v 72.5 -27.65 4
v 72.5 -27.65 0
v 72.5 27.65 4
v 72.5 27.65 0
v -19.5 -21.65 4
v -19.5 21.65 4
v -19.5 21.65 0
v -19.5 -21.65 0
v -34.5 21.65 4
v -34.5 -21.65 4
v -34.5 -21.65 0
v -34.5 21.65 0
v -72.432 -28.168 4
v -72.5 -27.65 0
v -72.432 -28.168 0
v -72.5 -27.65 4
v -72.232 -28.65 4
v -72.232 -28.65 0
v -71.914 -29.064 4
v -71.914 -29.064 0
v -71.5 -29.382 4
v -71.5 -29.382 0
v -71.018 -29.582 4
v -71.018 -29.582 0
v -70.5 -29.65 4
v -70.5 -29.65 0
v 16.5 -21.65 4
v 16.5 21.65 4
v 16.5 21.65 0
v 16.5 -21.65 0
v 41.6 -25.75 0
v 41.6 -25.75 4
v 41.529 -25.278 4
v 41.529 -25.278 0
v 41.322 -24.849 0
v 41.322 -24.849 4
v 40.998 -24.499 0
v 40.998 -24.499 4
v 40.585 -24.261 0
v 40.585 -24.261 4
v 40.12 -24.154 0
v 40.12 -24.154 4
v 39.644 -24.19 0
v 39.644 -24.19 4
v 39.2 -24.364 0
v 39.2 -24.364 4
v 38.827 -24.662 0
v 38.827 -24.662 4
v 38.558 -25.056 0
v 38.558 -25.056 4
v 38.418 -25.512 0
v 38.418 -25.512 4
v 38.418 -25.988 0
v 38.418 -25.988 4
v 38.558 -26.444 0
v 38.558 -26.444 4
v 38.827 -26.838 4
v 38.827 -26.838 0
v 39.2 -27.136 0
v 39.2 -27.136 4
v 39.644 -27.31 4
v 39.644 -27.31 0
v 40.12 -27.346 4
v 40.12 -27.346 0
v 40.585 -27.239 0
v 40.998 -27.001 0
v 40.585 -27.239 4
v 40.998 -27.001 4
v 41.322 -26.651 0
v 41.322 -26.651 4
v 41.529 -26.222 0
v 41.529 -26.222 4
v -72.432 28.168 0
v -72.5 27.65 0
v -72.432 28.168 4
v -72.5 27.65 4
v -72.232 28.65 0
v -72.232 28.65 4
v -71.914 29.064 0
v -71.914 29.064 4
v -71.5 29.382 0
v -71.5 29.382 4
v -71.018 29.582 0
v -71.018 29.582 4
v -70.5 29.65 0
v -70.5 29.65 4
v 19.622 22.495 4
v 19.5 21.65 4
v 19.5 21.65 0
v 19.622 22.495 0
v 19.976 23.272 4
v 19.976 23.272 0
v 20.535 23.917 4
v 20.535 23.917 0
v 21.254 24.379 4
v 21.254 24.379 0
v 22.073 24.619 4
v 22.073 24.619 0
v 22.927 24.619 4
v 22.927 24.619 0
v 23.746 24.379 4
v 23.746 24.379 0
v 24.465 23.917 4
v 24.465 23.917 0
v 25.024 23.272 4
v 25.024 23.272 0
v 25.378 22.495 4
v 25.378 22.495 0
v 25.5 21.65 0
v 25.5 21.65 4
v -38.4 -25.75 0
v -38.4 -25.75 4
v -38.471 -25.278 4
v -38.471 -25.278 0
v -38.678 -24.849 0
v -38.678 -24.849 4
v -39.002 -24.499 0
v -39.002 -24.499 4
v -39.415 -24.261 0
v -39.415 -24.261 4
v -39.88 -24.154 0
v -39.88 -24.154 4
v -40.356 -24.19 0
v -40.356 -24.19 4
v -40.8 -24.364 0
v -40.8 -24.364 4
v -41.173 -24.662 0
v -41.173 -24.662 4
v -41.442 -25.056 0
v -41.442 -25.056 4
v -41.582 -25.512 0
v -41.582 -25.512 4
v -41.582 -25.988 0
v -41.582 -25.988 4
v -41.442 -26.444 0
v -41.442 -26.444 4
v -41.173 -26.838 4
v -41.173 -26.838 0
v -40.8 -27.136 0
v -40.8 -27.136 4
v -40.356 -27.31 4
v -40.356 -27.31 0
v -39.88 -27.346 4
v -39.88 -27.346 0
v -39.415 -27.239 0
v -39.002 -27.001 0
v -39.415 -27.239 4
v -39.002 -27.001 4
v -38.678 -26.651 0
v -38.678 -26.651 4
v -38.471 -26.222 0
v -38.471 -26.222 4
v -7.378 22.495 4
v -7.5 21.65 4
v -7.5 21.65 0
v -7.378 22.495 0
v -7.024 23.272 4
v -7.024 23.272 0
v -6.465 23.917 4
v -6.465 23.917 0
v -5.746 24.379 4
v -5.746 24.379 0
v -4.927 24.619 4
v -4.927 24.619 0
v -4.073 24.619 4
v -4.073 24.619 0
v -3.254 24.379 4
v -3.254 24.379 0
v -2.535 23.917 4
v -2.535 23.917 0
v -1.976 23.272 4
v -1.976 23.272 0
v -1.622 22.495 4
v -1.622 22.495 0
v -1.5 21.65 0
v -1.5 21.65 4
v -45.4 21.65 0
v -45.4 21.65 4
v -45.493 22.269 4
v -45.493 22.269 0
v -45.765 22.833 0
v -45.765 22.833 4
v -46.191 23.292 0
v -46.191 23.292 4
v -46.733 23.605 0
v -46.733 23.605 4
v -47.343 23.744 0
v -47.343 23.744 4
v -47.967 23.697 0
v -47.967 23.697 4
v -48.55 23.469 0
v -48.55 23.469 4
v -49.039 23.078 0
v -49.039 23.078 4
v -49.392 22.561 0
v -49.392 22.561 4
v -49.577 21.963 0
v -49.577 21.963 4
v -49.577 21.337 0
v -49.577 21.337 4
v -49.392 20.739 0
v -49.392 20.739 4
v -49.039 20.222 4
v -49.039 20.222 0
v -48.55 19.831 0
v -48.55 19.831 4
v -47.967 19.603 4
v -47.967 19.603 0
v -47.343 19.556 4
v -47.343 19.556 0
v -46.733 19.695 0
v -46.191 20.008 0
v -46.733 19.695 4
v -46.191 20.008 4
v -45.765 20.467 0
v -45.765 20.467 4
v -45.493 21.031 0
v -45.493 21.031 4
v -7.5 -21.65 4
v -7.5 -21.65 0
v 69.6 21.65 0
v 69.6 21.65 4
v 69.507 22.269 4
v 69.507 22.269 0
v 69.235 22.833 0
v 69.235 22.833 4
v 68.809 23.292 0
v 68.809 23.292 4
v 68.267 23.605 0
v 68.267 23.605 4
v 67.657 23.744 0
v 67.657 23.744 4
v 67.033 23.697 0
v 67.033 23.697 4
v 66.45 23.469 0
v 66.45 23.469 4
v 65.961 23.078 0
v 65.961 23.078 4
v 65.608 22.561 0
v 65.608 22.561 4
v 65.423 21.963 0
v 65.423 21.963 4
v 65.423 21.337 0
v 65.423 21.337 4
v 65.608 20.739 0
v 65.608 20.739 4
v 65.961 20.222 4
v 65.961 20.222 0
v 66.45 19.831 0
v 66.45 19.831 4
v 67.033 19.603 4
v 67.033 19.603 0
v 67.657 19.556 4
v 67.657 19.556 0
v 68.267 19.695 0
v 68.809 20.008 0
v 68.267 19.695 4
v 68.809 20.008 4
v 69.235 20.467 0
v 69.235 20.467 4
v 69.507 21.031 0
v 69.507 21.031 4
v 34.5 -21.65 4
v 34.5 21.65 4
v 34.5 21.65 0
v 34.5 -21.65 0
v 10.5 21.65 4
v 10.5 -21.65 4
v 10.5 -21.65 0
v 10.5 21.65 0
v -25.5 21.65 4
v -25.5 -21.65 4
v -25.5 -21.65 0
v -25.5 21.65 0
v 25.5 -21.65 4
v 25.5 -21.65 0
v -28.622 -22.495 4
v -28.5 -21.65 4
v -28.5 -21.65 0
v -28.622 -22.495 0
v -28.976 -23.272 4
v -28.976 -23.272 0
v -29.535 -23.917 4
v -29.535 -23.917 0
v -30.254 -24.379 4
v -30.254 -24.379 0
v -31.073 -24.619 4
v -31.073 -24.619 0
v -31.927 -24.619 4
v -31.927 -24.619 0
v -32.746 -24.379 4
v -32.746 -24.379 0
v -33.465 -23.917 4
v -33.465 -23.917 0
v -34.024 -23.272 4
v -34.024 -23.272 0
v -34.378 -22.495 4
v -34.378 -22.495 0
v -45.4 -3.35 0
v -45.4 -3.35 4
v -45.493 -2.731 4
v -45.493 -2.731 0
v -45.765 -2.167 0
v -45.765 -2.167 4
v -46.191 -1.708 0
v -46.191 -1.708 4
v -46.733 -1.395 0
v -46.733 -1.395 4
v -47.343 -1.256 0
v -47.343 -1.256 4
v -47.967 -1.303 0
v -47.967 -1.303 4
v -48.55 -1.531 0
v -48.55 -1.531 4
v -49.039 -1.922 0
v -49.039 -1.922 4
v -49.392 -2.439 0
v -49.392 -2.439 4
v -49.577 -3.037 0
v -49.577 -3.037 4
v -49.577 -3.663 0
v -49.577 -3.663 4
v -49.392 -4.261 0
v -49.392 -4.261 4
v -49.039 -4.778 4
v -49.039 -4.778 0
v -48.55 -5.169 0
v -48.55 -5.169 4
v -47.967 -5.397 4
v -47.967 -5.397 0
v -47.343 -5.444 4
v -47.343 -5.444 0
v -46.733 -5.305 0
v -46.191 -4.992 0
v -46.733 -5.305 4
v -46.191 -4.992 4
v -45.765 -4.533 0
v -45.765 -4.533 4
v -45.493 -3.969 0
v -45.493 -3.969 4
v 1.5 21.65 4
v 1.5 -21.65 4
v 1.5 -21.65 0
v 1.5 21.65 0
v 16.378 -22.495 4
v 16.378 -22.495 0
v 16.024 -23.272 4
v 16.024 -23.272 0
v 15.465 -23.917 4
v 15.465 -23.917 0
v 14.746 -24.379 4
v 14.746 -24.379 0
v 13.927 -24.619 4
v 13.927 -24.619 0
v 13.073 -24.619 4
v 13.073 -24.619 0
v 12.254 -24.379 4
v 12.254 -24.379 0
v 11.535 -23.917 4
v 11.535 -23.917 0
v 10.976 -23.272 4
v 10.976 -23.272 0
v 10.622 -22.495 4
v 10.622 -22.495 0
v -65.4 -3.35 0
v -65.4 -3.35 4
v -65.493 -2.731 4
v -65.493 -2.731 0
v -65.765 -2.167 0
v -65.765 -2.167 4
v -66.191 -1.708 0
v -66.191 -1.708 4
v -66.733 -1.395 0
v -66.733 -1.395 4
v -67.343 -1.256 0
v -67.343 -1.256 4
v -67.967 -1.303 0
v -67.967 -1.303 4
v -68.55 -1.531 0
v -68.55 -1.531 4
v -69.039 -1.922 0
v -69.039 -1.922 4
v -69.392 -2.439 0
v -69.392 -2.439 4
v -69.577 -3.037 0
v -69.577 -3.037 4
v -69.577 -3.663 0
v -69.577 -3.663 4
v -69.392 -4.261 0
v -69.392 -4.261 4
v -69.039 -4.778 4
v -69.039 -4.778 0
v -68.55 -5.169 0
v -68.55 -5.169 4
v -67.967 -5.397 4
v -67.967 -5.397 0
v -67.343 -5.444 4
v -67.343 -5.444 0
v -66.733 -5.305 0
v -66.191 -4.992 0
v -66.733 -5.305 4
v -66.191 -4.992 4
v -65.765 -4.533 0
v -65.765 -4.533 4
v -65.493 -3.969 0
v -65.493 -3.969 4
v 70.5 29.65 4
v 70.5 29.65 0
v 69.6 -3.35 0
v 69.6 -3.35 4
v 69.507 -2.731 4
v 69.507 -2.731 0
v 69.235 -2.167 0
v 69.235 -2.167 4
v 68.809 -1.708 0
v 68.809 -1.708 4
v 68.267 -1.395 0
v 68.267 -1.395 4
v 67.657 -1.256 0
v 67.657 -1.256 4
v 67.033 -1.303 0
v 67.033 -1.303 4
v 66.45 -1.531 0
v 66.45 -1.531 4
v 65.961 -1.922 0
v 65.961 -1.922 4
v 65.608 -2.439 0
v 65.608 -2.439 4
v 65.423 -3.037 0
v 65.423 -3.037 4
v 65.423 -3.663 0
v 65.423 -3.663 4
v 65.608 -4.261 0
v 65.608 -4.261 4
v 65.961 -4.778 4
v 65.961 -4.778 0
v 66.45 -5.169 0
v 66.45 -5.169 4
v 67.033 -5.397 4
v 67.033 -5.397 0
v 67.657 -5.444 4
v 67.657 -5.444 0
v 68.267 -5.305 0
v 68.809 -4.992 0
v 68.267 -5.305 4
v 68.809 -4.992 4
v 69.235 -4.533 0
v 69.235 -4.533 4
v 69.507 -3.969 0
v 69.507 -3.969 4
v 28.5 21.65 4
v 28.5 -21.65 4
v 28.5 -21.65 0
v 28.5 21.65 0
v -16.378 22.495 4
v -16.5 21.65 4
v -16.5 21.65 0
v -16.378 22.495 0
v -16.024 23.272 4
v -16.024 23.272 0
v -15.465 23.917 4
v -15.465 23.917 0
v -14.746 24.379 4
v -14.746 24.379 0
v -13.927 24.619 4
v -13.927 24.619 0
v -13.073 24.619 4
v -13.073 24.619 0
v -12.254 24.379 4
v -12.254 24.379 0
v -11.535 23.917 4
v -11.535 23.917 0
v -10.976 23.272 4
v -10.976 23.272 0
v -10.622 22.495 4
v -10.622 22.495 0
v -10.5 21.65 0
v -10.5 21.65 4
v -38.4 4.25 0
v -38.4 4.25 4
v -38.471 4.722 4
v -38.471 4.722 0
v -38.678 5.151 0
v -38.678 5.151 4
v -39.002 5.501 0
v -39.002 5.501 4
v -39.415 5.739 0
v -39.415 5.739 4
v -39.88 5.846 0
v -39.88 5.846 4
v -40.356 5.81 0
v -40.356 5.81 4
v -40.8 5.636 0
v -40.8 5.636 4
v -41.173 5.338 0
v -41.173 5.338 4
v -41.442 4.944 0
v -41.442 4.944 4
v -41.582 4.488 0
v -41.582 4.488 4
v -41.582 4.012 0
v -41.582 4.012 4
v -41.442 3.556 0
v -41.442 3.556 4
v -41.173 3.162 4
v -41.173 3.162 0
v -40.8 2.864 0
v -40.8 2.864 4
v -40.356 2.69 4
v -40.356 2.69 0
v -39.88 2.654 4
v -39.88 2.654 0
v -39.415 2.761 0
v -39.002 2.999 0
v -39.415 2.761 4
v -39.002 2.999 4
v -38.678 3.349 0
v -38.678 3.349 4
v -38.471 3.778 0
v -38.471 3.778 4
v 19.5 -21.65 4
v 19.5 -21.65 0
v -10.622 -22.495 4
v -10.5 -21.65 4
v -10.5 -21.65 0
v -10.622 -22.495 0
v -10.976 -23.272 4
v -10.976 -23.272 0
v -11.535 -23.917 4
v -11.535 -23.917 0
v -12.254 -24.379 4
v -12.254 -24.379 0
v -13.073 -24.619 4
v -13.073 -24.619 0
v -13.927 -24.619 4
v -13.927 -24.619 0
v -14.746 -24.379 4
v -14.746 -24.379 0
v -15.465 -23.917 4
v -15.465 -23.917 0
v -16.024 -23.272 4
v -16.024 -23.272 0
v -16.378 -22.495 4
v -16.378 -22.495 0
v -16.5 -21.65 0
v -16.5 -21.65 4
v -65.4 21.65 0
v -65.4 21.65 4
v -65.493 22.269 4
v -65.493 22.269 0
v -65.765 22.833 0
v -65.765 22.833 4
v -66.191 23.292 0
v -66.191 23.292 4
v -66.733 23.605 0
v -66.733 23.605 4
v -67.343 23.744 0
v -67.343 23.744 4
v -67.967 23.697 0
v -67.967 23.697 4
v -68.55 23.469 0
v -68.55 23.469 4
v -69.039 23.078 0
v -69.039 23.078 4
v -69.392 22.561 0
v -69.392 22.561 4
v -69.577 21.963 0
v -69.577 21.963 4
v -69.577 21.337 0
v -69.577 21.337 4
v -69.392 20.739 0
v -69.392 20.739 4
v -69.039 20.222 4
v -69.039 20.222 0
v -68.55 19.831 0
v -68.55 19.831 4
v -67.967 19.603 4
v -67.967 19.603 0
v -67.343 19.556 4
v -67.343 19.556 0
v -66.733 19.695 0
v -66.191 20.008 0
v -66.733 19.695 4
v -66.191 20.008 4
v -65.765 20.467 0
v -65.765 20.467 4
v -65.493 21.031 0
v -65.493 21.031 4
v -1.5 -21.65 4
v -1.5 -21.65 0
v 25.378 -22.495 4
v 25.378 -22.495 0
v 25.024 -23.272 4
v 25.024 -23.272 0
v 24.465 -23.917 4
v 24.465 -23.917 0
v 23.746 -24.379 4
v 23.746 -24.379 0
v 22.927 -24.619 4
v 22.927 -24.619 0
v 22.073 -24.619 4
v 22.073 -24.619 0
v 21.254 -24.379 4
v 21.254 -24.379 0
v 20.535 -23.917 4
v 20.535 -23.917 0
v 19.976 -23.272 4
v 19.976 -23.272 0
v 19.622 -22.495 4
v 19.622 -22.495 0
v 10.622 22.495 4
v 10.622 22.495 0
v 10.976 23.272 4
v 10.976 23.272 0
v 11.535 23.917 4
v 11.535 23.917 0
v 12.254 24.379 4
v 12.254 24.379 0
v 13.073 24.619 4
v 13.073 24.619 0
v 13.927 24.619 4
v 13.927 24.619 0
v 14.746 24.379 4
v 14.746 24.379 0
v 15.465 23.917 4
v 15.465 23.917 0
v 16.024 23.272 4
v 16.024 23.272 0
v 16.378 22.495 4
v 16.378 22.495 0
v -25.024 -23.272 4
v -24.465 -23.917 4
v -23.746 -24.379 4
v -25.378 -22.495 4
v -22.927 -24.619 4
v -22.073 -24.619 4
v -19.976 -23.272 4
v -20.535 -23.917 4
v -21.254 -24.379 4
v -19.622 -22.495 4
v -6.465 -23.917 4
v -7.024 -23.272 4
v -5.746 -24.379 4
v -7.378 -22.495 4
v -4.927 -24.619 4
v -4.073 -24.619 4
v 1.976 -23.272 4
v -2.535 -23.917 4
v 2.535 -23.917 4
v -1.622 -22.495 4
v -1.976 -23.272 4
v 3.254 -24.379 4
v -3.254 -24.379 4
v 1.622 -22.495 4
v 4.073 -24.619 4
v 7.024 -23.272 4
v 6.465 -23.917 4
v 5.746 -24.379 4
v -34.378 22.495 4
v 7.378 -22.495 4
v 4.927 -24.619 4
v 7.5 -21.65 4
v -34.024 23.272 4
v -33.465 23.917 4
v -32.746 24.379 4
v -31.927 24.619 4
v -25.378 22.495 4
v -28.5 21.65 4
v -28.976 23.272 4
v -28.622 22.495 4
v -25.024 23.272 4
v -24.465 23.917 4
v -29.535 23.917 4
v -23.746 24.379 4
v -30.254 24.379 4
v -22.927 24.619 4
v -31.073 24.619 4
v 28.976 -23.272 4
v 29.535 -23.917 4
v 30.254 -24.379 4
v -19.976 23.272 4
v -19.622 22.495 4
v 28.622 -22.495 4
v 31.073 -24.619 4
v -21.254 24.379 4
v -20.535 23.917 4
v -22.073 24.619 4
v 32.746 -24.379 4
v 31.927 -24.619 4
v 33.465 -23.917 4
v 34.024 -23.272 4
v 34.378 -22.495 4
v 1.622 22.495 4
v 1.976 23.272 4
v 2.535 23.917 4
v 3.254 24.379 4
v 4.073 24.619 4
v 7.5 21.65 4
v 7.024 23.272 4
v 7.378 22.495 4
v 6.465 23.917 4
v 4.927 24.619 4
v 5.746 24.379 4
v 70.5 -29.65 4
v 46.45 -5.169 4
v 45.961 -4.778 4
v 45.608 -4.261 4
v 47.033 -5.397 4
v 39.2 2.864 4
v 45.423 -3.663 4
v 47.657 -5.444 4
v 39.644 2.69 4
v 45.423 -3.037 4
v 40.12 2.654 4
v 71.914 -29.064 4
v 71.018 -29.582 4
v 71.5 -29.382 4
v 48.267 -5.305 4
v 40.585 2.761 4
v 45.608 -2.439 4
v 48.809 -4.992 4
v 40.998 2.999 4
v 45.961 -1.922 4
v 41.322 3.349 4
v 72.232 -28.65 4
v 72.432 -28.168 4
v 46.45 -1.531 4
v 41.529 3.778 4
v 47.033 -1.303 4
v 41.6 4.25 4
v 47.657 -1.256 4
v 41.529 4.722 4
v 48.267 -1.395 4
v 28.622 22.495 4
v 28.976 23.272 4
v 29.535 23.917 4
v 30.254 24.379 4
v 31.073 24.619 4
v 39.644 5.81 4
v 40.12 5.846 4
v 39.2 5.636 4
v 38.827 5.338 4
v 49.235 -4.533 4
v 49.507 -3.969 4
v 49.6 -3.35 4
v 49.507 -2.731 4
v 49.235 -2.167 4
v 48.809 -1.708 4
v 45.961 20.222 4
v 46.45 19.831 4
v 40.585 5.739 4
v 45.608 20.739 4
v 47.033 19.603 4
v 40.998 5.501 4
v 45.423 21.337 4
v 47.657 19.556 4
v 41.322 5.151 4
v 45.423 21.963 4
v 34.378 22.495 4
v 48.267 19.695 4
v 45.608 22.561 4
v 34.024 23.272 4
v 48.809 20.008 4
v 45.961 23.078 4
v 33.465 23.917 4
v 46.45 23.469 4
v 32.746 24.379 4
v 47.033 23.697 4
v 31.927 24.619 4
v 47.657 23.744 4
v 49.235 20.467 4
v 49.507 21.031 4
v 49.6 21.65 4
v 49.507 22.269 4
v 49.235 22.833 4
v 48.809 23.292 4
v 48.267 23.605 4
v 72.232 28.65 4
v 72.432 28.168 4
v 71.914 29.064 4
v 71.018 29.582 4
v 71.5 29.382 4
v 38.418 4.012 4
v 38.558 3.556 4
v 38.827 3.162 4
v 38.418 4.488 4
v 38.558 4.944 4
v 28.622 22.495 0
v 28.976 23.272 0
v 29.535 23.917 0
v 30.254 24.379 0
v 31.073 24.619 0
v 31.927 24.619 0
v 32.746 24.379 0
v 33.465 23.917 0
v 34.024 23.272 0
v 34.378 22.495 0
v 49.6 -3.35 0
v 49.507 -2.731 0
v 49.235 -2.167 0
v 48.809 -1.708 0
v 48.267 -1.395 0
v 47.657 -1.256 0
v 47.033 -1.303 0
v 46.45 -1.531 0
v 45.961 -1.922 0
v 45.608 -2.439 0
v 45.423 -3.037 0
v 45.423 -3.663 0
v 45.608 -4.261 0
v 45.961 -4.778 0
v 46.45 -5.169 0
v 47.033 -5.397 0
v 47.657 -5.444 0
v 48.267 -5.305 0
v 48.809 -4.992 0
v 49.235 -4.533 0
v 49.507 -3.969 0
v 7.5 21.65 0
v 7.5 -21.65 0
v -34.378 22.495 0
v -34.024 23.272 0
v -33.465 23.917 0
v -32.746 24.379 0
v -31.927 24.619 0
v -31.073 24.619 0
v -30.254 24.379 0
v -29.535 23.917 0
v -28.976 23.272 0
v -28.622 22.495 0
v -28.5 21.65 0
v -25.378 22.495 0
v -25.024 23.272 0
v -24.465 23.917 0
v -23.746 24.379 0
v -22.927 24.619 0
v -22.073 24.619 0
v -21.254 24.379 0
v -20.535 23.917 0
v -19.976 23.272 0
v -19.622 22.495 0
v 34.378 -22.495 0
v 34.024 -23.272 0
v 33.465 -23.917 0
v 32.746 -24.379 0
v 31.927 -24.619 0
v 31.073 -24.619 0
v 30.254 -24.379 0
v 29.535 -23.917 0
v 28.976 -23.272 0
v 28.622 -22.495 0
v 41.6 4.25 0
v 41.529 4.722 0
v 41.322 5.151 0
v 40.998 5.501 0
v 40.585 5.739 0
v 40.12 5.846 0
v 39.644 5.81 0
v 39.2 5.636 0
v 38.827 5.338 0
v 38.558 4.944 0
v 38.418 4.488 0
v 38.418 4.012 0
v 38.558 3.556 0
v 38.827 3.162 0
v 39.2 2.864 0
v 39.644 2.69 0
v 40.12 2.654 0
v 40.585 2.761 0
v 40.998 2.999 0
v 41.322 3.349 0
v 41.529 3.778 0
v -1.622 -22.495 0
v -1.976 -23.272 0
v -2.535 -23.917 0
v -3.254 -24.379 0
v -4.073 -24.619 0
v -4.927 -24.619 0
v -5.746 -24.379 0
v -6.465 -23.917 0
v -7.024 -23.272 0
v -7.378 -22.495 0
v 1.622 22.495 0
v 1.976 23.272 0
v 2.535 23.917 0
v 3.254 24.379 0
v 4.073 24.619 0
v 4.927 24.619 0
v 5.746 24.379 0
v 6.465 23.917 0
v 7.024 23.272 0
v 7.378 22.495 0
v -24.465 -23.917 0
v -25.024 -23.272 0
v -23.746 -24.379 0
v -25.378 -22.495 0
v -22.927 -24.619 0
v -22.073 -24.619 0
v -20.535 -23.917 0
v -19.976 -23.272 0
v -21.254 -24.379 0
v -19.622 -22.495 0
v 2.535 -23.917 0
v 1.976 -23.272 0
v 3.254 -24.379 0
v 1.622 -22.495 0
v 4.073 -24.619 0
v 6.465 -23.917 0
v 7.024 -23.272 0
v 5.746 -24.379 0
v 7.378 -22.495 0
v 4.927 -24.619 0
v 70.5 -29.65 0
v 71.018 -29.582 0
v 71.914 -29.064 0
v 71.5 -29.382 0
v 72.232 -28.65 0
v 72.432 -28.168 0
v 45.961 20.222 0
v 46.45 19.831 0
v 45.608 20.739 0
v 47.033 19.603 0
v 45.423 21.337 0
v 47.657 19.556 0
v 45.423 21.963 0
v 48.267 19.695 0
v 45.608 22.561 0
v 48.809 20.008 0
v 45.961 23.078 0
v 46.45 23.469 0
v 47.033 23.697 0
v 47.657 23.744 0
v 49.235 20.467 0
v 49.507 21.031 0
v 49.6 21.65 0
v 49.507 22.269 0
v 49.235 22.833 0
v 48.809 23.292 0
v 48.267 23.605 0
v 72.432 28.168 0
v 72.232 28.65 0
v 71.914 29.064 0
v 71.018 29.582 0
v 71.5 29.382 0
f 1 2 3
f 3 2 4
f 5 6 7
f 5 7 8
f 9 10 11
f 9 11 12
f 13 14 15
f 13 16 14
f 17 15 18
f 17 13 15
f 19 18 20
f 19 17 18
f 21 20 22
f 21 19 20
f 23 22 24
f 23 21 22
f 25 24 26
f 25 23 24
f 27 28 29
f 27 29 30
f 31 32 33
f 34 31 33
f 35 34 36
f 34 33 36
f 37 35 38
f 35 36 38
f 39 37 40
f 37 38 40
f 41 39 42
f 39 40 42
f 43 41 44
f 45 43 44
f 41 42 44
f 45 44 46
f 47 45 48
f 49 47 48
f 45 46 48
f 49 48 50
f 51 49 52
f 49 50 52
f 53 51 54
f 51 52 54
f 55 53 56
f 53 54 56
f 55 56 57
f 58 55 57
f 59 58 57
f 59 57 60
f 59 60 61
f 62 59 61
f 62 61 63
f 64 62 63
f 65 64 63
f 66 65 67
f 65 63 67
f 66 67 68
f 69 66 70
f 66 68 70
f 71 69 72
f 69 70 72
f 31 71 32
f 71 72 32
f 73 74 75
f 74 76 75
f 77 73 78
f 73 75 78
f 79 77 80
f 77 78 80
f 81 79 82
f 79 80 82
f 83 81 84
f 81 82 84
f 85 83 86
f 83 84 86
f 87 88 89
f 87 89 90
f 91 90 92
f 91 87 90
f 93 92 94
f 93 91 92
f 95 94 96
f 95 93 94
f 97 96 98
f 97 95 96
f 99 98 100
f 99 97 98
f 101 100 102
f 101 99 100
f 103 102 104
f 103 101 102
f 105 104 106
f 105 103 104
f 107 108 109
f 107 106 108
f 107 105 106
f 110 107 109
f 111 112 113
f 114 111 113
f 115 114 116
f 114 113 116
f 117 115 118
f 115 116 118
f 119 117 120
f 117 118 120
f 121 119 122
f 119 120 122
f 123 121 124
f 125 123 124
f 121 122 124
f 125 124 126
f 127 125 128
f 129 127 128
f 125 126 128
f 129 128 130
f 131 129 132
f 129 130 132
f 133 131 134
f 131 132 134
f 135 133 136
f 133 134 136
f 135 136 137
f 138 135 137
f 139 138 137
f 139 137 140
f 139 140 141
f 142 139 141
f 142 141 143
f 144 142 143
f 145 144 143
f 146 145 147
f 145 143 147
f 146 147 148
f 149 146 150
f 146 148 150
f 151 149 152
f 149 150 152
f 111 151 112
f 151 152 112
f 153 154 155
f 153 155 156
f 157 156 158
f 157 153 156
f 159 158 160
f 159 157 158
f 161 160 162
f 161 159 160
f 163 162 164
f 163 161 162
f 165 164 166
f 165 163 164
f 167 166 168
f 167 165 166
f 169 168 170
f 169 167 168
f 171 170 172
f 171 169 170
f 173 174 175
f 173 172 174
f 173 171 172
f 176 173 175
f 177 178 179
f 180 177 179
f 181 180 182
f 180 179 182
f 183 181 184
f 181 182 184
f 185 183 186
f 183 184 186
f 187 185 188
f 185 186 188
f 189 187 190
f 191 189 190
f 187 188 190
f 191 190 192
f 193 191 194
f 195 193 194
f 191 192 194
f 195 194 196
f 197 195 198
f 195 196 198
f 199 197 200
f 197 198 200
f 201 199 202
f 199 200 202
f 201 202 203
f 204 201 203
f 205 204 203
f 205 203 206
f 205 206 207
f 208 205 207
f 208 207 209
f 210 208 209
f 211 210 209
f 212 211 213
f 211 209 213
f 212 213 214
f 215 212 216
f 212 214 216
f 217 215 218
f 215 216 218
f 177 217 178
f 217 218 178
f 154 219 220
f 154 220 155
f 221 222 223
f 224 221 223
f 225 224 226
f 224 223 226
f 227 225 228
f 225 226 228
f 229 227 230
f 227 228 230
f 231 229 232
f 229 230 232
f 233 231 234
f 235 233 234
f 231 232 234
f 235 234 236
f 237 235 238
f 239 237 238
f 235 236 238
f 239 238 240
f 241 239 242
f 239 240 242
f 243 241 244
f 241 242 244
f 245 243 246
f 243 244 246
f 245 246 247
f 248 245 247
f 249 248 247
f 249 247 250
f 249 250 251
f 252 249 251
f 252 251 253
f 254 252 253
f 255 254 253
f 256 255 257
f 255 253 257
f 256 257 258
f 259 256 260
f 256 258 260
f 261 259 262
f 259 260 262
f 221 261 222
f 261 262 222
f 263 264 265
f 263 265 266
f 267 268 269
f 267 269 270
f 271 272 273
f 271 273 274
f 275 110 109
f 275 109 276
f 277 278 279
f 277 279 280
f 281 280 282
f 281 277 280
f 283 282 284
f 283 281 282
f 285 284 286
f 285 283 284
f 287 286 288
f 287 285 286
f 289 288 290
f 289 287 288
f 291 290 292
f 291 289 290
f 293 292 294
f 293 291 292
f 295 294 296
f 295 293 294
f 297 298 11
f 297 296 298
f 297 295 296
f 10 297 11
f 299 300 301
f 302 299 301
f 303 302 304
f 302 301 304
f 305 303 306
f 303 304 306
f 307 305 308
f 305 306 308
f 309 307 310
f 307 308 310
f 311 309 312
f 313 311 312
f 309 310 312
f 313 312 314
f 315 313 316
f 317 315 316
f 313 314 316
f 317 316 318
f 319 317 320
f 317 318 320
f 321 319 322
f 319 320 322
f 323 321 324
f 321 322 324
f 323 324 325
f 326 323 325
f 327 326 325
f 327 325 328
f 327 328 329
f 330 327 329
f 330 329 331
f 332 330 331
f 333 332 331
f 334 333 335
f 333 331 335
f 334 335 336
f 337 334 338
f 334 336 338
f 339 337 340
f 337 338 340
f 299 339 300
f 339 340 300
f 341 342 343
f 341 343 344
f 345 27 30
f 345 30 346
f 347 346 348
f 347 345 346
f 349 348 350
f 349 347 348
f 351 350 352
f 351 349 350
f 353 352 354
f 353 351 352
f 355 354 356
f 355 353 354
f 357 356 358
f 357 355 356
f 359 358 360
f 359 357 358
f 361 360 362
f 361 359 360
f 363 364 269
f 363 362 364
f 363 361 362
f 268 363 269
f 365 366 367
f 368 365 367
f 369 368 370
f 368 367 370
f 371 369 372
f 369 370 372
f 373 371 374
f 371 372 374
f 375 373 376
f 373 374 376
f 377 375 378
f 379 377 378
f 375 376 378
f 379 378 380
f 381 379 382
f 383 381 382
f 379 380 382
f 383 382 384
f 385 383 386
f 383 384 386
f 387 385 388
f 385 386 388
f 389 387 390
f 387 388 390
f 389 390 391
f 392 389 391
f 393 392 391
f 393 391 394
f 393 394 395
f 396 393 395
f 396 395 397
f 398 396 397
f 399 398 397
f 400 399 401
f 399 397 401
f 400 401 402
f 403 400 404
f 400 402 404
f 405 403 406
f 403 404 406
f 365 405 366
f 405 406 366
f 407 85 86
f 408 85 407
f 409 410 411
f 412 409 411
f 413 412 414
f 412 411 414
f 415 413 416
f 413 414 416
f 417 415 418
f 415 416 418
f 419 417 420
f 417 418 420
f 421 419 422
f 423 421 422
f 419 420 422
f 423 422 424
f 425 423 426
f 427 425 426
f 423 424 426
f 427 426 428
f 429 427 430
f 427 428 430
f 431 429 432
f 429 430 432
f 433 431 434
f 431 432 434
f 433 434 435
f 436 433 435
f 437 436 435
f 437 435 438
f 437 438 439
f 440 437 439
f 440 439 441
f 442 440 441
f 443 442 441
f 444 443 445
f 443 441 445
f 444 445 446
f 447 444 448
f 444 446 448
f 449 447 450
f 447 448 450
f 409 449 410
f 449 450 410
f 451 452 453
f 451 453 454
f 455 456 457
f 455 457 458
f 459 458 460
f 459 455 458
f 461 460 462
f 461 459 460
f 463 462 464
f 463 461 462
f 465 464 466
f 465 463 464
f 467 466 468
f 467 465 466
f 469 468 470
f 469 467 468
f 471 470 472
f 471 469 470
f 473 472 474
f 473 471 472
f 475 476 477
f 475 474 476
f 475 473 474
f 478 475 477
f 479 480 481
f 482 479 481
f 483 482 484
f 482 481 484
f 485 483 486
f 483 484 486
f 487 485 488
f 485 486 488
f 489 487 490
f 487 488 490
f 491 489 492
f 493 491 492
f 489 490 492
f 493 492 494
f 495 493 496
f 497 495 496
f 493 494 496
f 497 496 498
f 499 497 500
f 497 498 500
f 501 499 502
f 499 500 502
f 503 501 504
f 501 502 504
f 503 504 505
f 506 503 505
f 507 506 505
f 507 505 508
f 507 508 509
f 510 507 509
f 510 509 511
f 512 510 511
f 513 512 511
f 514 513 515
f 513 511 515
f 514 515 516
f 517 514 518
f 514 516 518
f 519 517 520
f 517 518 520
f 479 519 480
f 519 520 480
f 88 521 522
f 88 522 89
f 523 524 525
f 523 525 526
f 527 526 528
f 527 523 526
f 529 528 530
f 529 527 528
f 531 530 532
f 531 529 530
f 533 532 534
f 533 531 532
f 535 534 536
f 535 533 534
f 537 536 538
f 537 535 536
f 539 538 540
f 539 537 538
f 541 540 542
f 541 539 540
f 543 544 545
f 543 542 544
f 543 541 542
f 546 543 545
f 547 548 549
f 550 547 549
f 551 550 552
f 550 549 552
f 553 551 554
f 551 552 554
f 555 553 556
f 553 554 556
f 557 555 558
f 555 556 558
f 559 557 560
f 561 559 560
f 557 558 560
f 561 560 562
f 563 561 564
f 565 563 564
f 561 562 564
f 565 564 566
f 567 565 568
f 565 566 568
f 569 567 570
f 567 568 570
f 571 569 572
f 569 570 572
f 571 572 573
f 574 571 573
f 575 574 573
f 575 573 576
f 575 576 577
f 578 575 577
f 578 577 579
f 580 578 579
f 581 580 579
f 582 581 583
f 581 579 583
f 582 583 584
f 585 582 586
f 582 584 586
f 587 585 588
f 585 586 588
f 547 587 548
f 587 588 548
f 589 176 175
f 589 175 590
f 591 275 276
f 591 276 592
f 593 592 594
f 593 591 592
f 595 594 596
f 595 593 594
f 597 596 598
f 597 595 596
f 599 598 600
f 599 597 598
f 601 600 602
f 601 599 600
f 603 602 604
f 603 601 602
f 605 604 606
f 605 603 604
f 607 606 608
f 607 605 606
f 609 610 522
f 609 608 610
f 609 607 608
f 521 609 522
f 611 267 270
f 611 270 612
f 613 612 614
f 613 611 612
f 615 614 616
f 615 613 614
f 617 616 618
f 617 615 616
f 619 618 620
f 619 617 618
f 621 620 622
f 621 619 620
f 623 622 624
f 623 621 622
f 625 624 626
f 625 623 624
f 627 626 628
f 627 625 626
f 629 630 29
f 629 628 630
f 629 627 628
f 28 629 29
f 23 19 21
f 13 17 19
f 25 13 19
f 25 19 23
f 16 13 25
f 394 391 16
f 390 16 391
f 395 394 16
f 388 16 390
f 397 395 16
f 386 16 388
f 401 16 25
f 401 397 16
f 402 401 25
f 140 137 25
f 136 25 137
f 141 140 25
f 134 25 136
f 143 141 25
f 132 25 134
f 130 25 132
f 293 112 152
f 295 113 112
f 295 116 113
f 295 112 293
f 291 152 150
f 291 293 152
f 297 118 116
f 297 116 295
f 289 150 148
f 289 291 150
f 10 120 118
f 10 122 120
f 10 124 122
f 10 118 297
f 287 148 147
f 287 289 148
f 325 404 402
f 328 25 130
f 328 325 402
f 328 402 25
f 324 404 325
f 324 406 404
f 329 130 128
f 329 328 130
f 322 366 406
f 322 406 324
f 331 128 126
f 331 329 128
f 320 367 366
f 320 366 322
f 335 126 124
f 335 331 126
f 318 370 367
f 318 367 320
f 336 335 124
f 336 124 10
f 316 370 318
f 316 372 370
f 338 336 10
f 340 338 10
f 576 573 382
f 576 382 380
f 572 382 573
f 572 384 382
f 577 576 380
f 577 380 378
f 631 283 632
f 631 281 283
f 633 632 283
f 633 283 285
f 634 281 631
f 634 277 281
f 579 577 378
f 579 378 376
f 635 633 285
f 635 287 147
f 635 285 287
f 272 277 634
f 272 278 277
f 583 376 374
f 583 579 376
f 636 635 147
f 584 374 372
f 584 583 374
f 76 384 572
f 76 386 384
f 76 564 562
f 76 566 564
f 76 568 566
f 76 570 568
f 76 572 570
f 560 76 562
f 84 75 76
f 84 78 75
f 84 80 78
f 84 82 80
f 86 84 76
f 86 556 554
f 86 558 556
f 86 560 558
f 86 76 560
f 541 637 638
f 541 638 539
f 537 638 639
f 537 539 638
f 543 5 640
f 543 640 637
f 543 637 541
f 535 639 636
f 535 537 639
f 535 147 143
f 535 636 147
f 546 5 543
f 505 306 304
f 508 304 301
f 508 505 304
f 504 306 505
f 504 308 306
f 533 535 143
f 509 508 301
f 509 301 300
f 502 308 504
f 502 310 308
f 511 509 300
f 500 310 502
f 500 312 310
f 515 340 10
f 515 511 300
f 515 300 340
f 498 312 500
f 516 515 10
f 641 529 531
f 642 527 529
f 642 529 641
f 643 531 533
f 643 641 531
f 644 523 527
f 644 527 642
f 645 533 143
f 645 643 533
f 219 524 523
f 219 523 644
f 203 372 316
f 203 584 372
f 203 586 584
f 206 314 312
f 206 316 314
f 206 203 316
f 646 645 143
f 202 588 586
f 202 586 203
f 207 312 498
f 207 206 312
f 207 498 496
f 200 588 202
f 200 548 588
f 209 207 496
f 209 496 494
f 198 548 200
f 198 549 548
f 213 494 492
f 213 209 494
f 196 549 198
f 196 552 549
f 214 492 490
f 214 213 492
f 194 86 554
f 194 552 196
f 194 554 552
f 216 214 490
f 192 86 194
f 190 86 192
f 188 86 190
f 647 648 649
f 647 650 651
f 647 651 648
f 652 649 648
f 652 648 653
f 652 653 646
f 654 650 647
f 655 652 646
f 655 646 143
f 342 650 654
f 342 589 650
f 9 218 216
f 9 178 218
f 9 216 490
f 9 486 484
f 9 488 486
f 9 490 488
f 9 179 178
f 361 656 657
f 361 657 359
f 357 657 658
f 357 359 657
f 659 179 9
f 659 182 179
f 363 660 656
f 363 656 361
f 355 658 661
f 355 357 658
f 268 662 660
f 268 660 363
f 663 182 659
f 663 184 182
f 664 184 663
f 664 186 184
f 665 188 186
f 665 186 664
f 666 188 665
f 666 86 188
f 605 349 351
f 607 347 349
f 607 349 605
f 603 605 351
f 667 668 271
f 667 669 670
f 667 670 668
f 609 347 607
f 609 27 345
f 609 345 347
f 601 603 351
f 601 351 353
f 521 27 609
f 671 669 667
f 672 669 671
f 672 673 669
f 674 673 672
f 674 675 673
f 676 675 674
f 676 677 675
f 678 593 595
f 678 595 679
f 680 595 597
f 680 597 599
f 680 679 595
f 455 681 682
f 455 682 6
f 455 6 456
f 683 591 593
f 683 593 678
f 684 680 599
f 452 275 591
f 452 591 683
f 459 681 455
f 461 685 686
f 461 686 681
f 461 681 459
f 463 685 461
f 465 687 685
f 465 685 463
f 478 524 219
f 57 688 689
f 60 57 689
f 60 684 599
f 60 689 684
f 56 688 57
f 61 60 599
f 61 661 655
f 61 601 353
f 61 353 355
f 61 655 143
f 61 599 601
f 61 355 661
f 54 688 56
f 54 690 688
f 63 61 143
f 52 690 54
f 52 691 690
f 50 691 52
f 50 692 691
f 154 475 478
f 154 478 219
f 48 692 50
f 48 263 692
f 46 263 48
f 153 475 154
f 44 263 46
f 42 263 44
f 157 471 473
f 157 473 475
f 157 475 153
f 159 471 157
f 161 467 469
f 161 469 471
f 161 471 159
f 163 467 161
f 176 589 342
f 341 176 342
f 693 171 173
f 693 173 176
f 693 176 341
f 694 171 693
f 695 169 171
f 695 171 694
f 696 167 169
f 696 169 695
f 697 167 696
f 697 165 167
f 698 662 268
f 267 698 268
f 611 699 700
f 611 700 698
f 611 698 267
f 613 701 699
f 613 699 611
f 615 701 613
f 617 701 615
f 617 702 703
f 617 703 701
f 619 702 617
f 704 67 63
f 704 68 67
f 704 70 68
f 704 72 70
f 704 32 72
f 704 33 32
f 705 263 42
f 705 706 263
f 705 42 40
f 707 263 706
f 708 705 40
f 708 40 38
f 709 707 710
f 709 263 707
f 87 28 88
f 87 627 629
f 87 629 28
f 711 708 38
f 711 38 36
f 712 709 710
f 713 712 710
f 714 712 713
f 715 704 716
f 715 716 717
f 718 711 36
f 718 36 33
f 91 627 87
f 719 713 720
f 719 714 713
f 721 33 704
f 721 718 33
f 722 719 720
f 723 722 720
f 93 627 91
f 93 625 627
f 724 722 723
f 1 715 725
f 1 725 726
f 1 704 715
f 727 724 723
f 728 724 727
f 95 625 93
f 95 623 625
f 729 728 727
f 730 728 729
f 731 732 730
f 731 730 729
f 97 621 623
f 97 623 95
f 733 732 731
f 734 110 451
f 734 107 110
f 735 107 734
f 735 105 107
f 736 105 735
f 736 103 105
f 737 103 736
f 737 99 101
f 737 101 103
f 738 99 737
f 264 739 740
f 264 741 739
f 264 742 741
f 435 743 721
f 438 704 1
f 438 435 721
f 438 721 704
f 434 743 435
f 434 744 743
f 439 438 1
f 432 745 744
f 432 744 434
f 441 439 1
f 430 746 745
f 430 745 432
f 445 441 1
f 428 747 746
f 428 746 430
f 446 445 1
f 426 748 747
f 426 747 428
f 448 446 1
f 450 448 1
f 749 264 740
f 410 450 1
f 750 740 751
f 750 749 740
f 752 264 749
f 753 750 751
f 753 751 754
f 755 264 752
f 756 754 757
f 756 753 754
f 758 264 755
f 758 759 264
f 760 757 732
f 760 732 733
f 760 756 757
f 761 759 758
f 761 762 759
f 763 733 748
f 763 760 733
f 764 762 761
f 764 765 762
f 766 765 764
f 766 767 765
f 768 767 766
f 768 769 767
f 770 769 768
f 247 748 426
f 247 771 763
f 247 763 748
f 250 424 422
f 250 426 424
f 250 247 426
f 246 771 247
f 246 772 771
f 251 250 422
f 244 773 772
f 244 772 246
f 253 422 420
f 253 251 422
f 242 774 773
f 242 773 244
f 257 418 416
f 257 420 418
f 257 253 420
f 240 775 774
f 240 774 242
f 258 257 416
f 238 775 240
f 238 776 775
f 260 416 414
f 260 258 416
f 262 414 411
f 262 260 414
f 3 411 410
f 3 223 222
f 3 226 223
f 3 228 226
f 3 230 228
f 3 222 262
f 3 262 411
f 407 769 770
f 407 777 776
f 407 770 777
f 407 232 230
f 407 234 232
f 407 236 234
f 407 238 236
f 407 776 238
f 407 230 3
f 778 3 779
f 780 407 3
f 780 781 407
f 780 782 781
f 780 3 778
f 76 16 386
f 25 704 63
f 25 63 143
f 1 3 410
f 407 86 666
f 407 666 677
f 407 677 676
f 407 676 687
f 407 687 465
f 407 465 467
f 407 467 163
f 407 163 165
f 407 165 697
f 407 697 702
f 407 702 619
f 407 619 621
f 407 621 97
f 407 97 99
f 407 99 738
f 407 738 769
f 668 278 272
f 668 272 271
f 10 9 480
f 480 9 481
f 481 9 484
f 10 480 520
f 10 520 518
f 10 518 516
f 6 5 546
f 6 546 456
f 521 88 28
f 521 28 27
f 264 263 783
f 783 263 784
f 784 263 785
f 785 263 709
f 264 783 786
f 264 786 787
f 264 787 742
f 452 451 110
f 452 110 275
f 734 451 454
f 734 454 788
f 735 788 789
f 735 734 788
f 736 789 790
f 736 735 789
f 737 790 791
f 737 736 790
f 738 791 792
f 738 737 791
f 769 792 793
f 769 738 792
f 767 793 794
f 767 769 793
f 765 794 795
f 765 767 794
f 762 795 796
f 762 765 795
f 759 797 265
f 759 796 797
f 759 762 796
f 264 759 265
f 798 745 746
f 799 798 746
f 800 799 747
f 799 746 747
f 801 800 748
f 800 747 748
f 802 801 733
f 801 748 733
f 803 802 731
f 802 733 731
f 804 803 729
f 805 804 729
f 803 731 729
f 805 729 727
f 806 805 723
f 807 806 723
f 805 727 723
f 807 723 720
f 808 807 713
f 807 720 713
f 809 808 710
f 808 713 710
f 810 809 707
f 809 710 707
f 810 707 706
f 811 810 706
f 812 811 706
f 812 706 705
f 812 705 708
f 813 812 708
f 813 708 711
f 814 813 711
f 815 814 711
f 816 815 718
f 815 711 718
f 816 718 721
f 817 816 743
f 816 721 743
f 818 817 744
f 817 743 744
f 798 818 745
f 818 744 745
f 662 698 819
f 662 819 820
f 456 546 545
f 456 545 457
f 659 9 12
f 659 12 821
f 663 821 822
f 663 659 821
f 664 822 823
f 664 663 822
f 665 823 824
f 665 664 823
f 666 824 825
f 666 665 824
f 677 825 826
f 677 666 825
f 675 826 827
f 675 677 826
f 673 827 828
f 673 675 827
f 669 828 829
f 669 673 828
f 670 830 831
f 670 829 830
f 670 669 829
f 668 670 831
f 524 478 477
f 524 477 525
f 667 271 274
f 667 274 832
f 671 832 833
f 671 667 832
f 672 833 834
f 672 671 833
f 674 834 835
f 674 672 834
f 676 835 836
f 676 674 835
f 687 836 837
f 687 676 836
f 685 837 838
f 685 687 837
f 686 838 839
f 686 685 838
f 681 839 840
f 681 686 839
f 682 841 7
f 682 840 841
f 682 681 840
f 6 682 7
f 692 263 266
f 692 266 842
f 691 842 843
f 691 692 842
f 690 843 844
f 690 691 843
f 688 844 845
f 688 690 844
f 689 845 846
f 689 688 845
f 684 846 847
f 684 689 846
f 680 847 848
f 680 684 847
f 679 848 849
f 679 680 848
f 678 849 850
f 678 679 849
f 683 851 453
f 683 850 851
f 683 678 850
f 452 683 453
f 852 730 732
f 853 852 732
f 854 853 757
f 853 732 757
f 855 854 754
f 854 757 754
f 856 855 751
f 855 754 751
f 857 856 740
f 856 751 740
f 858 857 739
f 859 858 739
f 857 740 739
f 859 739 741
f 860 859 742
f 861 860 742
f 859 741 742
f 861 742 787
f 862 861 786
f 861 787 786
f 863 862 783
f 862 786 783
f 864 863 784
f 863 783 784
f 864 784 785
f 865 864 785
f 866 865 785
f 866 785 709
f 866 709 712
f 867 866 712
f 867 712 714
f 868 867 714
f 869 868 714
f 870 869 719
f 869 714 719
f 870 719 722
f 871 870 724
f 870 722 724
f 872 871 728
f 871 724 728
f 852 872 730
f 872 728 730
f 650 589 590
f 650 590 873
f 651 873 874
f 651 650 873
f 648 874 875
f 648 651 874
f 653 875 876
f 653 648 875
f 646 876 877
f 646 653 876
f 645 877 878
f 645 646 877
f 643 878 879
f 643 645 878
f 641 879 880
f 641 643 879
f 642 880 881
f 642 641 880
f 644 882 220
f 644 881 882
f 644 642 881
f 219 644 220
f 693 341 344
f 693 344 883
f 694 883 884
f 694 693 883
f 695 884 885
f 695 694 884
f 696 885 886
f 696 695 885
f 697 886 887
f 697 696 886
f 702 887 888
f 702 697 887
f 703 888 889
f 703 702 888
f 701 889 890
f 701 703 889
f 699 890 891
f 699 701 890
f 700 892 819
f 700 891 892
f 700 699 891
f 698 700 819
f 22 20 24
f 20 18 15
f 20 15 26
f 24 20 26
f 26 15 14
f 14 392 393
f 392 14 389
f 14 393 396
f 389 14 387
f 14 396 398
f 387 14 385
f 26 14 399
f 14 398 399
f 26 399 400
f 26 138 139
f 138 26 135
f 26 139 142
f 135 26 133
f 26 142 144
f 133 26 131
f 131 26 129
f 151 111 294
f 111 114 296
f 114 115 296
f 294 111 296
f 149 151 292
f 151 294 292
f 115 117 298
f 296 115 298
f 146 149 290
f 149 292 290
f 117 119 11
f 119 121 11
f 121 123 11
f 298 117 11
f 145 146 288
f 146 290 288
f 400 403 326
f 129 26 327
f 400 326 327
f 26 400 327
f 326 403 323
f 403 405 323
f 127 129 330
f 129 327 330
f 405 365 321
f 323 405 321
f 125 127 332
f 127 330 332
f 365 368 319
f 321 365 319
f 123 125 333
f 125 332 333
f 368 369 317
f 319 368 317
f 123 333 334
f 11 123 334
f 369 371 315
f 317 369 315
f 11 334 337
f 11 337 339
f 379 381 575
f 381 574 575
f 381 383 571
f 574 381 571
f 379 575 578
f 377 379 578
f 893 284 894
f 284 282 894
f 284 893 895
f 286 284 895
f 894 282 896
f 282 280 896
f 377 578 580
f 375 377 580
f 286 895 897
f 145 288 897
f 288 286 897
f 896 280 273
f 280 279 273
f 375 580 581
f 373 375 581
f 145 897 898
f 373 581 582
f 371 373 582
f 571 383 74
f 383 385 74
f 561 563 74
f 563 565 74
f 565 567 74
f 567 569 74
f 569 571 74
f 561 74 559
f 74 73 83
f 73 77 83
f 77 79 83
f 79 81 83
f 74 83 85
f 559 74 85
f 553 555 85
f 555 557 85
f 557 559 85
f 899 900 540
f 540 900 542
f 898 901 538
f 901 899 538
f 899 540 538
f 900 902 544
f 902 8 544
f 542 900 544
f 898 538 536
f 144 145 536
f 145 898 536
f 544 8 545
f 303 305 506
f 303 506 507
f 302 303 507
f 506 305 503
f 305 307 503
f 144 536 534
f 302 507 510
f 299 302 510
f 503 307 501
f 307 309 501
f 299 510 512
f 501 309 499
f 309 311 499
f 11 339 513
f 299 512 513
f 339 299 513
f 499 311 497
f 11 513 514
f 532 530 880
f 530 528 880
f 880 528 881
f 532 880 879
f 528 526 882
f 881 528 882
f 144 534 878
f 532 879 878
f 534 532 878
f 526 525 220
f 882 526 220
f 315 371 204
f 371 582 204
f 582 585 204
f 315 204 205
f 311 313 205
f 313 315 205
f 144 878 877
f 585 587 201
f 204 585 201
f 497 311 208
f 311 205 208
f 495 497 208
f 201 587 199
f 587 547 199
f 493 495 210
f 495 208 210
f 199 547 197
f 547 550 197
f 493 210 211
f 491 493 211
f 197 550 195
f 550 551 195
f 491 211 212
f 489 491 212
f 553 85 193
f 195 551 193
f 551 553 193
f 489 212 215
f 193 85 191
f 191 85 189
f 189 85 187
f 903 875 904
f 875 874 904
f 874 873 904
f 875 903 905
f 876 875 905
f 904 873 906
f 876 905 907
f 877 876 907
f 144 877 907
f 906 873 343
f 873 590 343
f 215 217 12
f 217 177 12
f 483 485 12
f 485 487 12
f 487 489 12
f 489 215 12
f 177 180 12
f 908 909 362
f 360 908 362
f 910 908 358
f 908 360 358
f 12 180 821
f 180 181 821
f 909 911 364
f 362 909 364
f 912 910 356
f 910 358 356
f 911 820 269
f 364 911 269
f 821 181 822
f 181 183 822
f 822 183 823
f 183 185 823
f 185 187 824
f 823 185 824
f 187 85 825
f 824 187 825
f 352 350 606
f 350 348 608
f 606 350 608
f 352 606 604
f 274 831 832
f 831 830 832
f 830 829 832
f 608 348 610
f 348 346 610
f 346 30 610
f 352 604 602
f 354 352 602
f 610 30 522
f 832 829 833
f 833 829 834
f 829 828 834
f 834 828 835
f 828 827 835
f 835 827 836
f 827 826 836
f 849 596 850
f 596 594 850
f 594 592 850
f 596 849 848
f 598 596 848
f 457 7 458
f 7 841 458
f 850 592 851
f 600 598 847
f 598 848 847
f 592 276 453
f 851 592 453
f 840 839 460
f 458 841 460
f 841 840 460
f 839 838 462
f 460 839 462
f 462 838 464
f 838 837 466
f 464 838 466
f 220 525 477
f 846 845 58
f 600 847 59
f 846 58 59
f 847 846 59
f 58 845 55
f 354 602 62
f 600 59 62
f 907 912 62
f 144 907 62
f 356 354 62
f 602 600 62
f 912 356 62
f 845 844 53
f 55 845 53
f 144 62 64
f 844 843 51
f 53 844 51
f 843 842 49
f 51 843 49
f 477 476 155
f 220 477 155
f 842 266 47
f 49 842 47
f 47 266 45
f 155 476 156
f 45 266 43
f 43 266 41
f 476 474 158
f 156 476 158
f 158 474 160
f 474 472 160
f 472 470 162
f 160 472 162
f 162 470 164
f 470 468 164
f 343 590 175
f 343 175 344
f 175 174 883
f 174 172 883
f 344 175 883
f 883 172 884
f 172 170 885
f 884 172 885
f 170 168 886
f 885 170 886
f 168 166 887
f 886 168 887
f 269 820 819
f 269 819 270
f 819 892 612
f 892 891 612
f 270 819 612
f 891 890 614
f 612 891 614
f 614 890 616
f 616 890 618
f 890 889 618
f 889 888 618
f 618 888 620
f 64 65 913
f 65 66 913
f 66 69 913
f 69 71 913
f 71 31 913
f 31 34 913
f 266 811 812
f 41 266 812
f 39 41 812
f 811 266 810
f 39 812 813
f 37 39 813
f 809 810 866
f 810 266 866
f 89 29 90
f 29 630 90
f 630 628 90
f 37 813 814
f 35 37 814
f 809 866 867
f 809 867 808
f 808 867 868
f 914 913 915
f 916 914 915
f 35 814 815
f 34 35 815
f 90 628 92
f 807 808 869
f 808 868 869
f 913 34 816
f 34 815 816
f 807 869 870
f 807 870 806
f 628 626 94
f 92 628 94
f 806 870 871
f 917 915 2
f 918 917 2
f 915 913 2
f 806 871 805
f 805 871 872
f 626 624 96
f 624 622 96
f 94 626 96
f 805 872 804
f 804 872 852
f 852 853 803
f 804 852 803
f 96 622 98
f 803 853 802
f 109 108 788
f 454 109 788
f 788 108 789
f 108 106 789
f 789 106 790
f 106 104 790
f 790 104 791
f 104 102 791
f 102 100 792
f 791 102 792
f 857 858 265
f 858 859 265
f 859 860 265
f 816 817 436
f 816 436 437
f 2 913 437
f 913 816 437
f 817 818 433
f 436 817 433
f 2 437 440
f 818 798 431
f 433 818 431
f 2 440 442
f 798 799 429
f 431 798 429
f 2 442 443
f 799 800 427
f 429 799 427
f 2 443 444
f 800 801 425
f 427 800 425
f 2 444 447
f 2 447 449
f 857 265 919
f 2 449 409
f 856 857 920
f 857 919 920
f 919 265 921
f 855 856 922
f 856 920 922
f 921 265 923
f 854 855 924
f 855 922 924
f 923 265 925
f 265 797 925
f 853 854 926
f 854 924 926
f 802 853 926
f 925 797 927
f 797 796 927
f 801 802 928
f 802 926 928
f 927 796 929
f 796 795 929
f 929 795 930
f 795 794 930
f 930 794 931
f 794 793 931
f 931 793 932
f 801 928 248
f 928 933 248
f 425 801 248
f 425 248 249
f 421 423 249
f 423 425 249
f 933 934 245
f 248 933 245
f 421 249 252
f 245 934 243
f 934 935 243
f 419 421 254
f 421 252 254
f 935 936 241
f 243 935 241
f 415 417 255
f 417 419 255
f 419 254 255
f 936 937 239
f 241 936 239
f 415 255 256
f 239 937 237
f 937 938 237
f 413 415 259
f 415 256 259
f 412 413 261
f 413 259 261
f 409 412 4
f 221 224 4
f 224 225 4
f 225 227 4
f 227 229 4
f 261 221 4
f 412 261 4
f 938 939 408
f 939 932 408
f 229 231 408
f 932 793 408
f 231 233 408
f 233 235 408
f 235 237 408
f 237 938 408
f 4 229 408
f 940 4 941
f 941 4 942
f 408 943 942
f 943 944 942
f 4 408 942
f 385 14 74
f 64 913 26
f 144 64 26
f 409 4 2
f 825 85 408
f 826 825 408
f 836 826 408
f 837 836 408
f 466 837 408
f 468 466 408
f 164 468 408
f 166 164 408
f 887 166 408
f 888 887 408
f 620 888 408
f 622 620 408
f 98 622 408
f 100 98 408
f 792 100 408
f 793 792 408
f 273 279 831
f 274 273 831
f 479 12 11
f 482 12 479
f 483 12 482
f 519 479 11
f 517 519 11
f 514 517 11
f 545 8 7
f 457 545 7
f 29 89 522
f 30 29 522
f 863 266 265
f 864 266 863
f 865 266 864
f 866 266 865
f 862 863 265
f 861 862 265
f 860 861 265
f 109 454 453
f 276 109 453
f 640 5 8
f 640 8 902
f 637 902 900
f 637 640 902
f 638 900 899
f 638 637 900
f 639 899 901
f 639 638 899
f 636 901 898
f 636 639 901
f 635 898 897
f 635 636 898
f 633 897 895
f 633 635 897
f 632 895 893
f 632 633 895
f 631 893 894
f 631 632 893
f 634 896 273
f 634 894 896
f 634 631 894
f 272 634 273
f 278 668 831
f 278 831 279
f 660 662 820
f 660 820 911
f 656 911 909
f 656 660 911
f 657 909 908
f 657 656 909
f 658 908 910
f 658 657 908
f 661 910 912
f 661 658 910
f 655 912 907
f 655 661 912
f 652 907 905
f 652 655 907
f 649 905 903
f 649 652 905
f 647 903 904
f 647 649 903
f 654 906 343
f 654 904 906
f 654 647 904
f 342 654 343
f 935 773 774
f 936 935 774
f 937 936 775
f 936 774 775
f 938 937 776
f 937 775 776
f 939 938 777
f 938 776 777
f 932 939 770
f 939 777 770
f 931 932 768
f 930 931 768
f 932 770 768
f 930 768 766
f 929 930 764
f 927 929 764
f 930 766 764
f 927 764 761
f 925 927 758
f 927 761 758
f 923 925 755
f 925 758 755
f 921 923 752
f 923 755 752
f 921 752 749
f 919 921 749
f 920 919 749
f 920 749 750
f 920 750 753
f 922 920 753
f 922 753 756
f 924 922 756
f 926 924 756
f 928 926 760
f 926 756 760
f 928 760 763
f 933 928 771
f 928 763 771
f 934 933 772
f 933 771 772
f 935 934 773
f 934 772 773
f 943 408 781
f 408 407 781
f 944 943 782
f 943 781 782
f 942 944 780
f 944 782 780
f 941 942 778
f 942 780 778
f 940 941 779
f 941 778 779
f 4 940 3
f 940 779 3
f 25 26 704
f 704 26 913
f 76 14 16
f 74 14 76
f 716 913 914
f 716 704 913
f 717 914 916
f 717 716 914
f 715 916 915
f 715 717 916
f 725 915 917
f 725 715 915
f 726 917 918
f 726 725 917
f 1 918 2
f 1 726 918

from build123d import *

# Parameters (mm, degrees)
SKETCH_1_W          = 145
SKETCH_1_H          = 59.3
EXTRUDE_1_DEPTH     = 4
SKETCH_2_R          = 2.1
CUT_EXTRUDE_1_DEPTH = 4
SKETCH_3_R          = 1.6
CUT_EXTRUDE_2_DEPTH = 4
FILLET_1_R          = 2
CUT_EXTRUDE_3_DEPTH = 5


with BuildPart() as part:
    # 草图1 → 凸台-拉伸1 (new body)
    with BuildSketch(Plane.XY):
        Rectangle(SKETCH_1_W, SKETCH_1_H)
    extrude(amount=EXTRUDE_1_DEPTH)

    # 草图2 → 切除-拉伸1 (cut)
    with BuildSketch(Plane.XY.offset(4)):
        with Locations((-67.5, 21.65)):
            Circle(SKETCH_2_R)
        with Locations((67.5, 21.65)):
            Circle(SKETCH_2_R)
        with Locations((67.5, -3.35)):
            Circle(SKETCH_2_R)
        with Locations((-67.5, -3.35)):
            Circle(SKETCH_2_R)
        with Locations((-47.5, 21.65)):
            Circle(SKETCH_2_R)
        with Locations((47.5, 21.65)):
            Circle(SKETCH_2_R)
        with Locations((47.5, -3.35)):
            Circle(SKETCH_2_R)
        with Locations((-47.5, -3.35)):
            Circle(SKETCH_2_R)
    extrude(amount=-CUT_EXTRUDE_1_DEPTH, mode=Mode.SUBTRACT)

    # 草图3 → 切除-拉伸2 (cut)
    with BuildSketch(Plane.XY.offset(4)):
        with Locations((-40, 4.25)):
            Circle(SKETCH_3_R)
        with Locations((40, 4.25)):
            Circle(SKETCH_3_R)
        with Locations((40, -25.75)):
            Circle(SKETCH_3_R)
        with Locations((-40, -25.75)):
            Circle(SKETCH_3_R)
    extrude(amount=-CUT_EXTRUDE_2_DEPTH, mode=Mode.SUBTRACT)

    # 圆角1
    fillet_1_edges = [part.edges().sort_by_distance(p)[0] for p in [
        (72.5, -29.65, 2),
        (-72.5, -29.65, 2),
        (-72.5, 29.65, 2),
        (72.5, 29.65, 2),
    ]]
    fillet(fillet_1_edges, radius=FILLET_1_R)

    # 草图4 → 切除-拉伸3 (cut)
    with BuildSketch(Plane.XY.offset(4)):
        with BuildLine():
            Line((-28.5, 21.65), (-28.5, -21.65))
            ThreePointArc((-28.5, -21.65), (-31.5, -24.65), (-34.5, -21.65))
            Line((-34.5, -21.65), (-34.5, 21.65))
            ThreePointArc((-34.5, 21.65), (-31.5, 24.65), (-28.5, 21.65))
        make_face()
        with BuildLine():
            Line((-19.5, 21.65), (-19.5, -21.65))
            ThreePointArc((-19.5, -21.65), (-22.5, -24.65), (-25.5, -21.65))
            Line((-25.5, -21.65), (-25.5, 21.65))
            ThreePointArc((-25.5, 21.65), (-22.5, 24.65), (-19.5, 21.65))
        make_face()
        with BuildLine():
            Line((-10.5, 21.65), (-10.5, -21.65))
            ThreePointArc((-10.5, -21.65), (-13.5, -24.65), (-16.5, -21.65))
            Line((-16.5, -21.65), (-16.5, 21.65))
            ThreePointArc((-16.5, 21.65), (-13.5, 24.65), (-10.5, 21.65))
        make_face()
        with BuildLine():
            Line((-1.5, 21.65), (-1.5, -21.65))
            ThreePointArc((-1.5, -21.65), (-4.5, -24.65), (-7.5, -21.65))
            Line((-7.5, -21.65), (-7.5, 21.65))
            ThreePointArc((-7.5, 21.65), (-4.5, 24.65), (-1.5, 21.65))
        make_face()
        with BuildLine():
            Line((7.5, 21.65), (7.5, -21.65))
            ThreePointArc((7.5, -21.65), (4.5, -24.65), (1.5, -21.65))
            Line((1.5, -21.65), (1.5, 21.65))
            ThreePointArc((1.5, 21.65), (4.5, 24.65), (7.5, 21.65))
        make_face()
        with BuildLine():
            Line((16.5, 21.65), (16.5, -21.65))
            ThreePointArc((16.5, -21.65), (13.5, -24.65), (10.5, -21.65))
            Line((10.5, -21.65), (10.5, 21.65))
            ThreePointArc((10.5, 21.65), (13.5, 24.65), (16.5, 21.65))
        make_face()
        with BuildLine():
            Line((25.5, 21.65), (25.5, -21.65))
            ThreePointArc((25.5, -21.65), (22.5, -24.65), (19.5, -21.65))
            Line((19.5, -21.65), (19.5, 21.65))
            ThreePointArc((19.5, 21.65), (22.5, 24.65), (25.5, 21.65))
        make_face()
        with BuildLine():
            Line((34.5, 21.65), (34.5, -21.65))
            ThreePointArc((34.5, -21.65), (31.5, -24.65), (28.5, -21.65))
            Line((28.5, -21.65), (28.5, 21.65))
            ThreePointArc((28.5, 21.65), (31.5, 24.65), (34.5, 21.65))
        make_face()
    extrude(amount=-CUT_EXTRUDE_3_DEPTH, mode=Mode.SUBTRACT)


solid = part.part
